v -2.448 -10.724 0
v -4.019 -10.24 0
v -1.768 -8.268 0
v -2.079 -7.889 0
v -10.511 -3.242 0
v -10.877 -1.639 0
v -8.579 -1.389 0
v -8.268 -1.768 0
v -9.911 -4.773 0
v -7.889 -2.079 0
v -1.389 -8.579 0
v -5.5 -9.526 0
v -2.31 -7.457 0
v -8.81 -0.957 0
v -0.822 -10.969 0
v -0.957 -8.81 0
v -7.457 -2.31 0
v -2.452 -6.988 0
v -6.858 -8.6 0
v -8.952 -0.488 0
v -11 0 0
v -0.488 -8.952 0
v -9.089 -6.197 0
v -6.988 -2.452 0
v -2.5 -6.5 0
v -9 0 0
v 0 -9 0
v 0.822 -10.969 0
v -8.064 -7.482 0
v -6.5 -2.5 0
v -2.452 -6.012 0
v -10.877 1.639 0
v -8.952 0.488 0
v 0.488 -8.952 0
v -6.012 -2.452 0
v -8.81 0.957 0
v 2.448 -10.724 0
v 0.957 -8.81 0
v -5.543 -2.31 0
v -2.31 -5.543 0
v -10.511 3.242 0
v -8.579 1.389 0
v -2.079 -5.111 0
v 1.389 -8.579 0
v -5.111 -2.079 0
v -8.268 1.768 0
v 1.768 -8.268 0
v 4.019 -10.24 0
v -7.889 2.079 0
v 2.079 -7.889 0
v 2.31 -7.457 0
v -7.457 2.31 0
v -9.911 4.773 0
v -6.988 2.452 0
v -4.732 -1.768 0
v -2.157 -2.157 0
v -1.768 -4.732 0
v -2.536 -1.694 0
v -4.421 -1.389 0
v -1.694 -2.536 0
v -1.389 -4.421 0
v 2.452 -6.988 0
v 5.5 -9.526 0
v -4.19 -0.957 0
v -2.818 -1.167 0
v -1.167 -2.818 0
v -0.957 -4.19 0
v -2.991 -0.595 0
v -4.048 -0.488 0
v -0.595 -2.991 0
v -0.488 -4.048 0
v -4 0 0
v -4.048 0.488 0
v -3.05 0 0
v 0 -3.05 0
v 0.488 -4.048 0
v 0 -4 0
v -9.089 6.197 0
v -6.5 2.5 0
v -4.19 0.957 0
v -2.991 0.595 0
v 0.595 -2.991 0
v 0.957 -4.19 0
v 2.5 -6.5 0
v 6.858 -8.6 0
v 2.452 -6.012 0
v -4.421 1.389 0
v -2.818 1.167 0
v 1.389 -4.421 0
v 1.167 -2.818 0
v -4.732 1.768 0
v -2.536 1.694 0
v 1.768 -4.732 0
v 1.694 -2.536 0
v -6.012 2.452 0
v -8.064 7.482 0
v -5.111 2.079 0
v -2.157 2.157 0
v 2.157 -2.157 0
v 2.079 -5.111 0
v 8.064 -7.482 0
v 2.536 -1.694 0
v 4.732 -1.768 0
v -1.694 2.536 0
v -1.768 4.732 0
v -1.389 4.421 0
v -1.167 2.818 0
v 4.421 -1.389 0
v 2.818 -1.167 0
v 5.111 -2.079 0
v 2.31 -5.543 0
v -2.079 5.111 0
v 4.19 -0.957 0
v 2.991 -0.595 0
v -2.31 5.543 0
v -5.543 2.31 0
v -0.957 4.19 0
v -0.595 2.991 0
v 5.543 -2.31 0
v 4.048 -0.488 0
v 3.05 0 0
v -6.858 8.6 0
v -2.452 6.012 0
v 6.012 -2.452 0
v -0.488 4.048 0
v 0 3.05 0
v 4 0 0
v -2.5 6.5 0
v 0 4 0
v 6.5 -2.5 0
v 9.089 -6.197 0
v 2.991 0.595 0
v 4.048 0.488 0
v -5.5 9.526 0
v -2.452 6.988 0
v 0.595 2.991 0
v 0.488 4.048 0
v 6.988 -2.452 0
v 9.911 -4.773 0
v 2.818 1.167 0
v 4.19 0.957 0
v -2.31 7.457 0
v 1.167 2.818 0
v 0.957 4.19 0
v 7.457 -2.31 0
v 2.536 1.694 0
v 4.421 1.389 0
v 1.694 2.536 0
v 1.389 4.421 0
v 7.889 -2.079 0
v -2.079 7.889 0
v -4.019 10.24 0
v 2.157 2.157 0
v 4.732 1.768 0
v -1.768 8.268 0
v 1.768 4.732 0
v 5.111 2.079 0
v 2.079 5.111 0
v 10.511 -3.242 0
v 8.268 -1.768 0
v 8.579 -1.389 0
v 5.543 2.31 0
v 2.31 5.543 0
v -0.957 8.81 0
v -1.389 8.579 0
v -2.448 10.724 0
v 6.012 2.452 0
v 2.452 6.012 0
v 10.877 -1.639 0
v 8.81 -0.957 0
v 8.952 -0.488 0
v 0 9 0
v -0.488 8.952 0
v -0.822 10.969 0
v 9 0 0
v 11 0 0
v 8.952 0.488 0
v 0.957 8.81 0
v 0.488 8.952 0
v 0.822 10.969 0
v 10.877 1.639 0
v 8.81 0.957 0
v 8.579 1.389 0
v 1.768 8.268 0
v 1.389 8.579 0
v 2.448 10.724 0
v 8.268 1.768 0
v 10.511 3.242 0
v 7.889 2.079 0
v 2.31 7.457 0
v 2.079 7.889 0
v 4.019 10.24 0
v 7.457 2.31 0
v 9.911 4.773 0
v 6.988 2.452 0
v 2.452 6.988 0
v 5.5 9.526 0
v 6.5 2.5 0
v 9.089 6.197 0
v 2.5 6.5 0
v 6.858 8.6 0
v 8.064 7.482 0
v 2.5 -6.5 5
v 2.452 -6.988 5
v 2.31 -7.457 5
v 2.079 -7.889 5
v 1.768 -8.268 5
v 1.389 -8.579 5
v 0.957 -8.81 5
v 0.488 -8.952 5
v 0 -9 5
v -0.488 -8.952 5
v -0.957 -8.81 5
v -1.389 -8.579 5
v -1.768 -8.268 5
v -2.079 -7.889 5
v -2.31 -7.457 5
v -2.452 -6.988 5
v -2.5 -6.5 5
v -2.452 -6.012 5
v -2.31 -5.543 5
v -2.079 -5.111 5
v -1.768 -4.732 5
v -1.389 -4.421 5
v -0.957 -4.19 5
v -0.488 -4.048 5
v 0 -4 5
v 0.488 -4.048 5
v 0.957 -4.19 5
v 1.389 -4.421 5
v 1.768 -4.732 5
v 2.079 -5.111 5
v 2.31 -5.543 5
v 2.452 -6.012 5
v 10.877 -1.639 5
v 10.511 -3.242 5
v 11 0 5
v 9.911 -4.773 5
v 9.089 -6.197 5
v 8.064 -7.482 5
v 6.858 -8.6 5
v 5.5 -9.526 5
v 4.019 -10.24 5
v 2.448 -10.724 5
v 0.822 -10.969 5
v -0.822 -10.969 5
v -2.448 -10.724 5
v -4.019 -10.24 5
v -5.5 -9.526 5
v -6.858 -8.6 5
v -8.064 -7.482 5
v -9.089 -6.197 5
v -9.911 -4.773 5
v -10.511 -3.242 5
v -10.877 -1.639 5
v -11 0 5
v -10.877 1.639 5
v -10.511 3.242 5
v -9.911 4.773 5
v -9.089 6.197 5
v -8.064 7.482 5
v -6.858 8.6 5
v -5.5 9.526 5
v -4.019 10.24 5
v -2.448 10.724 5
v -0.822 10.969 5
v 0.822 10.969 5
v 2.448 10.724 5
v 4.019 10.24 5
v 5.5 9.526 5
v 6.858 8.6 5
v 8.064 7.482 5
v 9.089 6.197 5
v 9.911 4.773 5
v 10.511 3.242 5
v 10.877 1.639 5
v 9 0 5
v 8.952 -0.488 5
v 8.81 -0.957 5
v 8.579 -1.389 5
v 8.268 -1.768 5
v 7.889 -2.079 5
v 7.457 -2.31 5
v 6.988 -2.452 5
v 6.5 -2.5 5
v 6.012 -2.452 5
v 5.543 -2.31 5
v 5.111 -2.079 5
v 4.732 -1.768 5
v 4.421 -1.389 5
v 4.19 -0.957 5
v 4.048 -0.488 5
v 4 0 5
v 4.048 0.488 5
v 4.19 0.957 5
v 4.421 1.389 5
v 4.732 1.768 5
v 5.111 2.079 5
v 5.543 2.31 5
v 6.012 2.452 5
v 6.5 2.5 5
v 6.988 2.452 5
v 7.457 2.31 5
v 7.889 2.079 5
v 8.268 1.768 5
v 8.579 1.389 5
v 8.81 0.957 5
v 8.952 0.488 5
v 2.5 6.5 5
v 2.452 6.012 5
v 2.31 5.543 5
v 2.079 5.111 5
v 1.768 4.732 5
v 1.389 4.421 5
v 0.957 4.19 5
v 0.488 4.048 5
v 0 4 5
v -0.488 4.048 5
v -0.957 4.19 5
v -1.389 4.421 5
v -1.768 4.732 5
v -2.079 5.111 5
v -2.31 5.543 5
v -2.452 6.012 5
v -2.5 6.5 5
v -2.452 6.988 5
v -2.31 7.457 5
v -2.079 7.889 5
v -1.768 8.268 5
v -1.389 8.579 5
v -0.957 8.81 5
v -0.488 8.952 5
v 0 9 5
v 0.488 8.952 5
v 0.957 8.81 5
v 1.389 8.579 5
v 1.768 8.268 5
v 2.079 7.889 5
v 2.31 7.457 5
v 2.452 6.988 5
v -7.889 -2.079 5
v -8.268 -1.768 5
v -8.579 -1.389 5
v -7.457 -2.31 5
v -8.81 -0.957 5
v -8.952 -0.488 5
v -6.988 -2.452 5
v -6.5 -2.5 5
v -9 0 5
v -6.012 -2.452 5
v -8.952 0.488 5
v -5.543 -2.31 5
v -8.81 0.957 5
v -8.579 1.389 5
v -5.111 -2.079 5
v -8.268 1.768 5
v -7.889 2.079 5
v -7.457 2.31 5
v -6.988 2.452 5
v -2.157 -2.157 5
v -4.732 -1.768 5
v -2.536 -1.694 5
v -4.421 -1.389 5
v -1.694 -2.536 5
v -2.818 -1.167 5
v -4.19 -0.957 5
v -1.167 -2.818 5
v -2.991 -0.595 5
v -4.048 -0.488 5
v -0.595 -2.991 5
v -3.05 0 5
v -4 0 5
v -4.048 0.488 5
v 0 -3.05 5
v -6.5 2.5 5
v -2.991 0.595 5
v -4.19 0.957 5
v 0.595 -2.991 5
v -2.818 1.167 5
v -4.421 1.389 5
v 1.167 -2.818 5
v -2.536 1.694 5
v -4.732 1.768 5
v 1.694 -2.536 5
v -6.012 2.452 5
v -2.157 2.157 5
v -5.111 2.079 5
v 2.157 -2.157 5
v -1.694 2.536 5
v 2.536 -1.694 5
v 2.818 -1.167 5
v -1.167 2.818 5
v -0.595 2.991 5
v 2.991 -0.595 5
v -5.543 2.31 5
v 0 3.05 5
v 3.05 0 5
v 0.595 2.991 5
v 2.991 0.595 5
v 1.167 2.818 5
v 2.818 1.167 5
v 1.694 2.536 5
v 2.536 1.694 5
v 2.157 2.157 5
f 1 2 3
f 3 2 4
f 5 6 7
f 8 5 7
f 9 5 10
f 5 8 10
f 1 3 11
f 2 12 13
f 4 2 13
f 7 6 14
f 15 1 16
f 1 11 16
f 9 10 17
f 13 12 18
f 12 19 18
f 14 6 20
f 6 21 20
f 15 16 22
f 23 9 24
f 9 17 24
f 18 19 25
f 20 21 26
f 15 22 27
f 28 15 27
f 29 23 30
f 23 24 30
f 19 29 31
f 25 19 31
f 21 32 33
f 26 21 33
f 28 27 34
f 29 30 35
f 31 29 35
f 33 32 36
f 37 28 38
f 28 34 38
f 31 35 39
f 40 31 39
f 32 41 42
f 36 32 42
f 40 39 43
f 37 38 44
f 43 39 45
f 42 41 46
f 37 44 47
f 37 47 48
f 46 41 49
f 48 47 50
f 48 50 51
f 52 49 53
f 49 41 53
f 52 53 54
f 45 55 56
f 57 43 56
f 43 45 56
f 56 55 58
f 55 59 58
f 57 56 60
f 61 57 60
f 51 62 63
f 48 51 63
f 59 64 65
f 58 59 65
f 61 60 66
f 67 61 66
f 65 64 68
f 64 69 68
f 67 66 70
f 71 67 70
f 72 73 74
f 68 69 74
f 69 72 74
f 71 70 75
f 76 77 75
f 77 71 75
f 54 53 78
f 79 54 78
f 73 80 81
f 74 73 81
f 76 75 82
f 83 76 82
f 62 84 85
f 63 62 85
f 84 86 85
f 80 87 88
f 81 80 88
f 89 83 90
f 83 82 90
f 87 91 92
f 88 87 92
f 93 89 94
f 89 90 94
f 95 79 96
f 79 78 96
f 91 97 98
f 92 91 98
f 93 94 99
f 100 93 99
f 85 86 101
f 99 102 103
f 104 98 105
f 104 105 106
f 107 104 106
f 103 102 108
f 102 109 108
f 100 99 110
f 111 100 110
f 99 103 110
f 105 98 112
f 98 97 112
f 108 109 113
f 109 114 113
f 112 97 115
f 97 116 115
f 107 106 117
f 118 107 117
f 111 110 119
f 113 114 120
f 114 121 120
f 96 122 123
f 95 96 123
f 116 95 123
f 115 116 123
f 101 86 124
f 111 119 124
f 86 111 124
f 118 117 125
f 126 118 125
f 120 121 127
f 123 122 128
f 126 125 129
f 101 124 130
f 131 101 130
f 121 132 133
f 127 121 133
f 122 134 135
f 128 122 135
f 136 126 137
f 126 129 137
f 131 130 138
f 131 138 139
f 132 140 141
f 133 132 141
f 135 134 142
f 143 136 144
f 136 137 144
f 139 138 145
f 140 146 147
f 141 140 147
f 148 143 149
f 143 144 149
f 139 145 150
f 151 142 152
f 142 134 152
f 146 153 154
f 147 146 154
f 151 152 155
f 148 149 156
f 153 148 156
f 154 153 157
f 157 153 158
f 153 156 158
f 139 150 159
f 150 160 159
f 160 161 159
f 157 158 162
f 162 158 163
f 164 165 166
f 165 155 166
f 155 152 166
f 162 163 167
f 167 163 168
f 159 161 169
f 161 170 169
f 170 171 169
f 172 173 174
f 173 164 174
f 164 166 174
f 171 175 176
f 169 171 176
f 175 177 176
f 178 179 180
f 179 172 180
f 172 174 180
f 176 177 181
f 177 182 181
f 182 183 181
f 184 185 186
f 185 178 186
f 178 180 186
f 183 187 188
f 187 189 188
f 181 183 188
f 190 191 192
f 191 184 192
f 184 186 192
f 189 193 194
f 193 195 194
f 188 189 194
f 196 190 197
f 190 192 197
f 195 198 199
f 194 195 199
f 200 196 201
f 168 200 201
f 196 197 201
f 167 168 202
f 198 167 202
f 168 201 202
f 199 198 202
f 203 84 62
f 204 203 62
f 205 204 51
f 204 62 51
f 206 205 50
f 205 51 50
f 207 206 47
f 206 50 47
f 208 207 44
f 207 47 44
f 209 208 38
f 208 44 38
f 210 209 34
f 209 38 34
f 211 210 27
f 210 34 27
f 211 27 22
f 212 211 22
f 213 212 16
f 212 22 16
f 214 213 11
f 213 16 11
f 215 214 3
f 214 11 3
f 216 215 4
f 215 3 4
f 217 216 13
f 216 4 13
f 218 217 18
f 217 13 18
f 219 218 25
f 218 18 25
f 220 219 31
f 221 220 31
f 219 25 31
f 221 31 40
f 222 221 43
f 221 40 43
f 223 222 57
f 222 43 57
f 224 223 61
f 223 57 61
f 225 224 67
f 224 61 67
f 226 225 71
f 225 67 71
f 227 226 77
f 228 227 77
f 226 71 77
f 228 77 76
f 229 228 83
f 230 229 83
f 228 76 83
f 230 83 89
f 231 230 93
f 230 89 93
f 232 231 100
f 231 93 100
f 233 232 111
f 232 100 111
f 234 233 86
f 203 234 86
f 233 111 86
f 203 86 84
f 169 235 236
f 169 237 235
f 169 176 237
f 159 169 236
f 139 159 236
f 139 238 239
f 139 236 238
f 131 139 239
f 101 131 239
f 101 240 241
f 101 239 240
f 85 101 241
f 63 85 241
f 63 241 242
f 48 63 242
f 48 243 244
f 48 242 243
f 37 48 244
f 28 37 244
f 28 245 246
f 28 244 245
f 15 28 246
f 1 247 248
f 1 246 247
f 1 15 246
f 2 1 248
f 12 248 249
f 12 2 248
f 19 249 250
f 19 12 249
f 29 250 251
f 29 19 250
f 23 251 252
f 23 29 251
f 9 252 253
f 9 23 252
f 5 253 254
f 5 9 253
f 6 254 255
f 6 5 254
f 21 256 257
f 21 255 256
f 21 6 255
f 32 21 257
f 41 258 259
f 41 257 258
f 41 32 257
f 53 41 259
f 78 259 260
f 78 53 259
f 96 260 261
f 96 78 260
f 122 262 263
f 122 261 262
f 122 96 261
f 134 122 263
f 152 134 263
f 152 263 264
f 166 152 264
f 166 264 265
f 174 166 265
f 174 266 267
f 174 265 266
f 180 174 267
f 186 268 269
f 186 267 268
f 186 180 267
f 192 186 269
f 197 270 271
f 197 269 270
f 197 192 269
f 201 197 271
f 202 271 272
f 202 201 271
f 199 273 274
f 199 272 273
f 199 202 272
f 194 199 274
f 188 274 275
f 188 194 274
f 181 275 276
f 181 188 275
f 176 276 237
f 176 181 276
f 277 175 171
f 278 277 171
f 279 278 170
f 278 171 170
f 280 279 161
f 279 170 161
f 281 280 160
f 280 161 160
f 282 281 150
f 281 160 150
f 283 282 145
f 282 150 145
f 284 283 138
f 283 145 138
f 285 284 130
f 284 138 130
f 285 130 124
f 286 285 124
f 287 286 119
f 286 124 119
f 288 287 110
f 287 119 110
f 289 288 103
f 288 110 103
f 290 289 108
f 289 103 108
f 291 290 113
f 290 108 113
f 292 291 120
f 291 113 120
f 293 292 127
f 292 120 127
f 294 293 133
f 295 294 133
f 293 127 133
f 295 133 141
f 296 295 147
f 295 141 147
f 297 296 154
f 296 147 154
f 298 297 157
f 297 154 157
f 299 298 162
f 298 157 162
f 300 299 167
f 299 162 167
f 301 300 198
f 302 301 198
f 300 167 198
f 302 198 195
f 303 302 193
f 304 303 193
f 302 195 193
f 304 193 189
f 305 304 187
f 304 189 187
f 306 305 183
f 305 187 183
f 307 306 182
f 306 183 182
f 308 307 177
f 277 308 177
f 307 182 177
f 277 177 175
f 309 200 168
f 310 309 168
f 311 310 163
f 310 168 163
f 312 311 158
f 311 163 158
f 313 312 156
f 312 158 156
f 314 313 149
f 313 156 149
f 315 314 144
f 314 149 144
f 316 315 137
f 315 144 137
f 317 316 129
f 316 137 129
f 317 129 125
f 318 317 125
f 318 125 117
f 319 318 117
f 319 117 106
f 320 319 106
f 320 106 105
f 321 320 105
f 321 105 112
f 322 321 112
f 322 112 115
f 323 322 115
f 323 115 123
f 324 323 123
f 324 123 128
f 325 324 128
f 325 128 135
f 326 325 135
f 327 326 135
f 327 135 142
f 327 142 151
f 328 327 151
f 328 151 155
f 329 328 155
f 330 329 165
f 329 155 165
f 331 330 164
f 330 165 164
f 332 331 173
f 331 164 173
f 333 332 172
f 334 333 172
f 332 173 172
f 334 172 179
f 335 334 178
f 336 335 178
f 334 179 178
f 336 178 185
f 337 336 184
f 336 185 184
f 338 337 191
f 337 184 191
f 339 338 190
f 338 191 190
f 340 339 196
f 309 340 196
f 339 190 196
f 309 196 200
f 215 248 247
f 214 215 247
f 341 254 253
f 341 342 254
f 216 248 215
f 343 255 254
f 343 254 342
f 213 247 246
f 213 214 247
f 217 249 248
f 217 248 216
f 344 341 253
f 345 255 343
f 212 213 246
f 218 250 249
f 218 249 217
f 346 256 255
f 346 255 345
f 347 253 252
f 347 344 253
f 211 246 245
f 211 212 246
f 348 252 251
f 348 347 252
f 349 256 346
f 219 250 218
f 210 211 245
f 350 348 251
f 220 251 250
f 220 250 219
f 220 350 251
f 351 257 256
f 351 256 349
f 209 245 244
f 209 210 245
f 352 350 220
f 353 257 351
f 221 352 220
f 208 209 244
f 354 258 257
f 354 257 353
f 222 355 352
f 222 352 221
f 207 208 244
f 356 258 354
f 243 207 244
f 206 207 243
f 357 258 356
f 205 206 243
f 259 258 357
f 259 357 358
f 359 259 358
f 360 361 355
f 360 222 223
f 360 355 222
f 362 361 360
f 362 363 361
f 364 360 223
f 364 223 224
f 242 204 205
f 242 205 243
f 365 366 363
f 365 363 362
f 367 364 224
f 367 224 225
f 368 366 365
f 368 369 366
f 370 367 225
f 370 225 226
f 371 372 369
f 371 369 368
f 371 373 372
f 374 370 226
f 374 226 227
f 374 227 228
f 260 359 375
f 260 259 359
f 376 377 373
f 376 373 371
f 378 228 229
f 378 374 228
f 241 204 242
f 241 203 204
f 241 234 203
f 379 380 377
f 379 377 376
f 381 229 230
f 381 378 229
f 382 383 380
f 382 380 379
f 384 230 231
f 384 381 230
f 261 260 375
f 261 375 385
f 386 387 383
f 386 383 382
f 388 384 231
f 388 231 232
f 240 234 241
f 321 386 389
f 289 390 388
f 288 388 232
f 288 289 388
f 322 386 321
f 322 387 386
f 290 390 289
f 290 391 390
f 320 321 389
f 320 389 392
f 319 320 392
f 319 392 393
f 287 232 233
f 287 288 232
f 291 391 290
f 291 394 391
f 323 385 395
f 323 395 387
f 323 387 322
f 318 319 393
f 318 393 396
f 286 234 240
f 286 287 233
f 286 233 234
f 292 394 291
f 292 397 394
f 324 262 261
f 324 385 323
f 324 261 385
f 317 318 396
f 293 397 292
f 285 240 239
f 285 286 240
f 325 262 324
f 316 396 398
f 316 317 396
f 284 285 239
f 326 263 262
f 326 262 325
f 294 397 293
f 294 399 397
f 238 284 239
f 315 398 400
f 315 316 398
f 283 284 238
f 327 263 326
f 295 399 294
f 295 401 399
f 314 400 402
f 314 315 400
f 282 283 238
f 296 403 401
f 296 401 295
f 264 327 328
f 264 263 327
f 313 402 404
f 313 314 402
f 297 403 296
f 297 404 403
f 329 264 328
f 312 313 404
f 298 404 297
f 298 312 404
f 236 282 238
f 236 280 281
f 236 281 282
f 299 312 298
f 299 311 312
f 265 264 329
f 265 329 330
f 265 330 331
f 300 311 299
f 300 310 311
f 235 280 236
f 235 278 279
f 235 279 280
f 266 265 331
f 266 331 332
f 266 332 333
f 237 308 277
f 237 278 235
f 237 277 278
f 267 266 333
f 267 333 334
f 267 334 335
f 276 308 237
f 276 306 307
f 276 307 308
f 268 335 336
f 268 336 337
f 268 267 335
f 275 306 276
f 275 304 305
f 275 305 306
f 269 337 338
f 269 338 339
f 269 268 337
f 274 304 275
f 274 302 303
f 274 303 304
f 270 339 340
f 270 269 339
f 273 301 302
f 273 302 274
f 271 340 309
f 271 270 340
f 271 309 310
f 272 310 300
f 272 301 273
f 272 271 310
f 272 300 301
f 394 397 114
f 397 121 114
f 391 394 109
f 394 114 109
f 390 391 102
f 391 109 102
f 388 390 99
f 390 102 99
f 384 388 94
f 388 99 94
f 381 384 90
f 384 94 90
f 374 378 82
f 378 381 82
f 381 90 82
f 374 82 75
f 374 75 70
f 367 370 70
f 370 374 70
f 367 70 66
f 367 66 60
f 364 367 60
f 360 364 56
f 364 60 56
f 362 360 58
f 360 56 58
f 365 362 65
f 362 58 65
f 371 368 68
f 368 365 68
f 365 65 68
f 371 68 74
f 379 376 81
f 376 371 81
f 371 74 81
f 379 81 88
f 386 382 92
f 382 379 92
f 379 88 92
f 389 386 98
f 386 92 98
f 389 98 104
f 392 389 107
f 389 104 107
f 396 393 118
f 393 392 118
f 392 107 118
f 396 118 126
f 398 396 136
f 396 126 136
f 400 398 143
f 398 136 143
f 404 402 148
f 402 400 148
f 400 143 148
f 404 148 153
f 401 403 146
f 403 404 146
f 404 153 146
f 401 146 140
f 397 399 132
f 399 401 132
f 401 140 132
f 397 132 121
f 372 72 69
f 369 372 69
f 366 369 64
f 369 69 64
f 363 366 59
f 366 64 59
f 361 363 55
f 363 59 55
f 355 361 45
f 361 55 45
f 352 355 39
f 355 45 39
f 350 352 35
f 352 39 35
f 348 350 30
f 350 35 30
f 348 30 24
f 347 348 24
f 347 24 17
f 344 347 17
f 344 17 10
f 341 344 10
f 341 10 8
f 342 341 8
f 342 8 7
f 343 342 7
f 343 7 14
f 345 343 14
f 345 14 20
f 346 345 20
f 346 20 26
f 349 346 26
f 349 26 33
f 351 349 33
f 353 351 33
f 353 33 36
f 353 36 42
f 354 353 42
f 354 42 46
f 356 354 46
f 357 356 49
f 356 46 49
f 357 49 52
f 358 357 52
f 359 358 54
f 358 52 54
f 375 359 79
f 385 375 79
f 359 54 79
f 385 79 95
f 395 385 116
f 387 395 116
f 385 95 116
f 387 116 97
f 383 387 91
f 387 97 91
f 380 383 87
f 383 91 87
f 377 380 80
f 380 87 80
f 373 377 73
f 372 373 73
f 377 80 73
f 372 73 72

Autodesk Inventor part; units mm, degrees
ref_plane "YZ Plane" through (0, 0, 0) normal (1, 0, 0) x (0, 1, 0)
ref_plane "XZ Plane" through (0, 0, 0) normal (0, 1, 0) x (-1, 0, 0)
ref_plane "XY Plane" through (0, 0, 0) normal (0, 0, 1) x (1, 0, 0)
sketch "スケッチ1" plane through (0, 0, 0) normal (0, 0, 1) x (1, 0, 0)
  circle A0 centre (0, 0) radius 3.05
  circle A1 centre (0, 0) radius 11
  circle A2 centre (0, 0) radius 6.5
  circle A3 centre (0, 6.5) radius 2.5
  circle A4 centre (0, -6.5) radius 2.5
  circle A5 centre (6.5, 0) radius 2.5
  circle A6 centre (-6.5, 0) radius 2.5
  dimension "d0" = 6.1
  dimension "d1" = 22
  dimension "d2" = 13
  dimension "d3" = 5
  dimension "d4" = 5
  dimension "d5" = 5
  dimension "d6" = 5
extrude "押し出し1" add sketch "スケッチ1" along normal blind 5 contours A1 | A5 A2 A4 A6 A3
properties part number "passive_walking_robot6_parts2"
